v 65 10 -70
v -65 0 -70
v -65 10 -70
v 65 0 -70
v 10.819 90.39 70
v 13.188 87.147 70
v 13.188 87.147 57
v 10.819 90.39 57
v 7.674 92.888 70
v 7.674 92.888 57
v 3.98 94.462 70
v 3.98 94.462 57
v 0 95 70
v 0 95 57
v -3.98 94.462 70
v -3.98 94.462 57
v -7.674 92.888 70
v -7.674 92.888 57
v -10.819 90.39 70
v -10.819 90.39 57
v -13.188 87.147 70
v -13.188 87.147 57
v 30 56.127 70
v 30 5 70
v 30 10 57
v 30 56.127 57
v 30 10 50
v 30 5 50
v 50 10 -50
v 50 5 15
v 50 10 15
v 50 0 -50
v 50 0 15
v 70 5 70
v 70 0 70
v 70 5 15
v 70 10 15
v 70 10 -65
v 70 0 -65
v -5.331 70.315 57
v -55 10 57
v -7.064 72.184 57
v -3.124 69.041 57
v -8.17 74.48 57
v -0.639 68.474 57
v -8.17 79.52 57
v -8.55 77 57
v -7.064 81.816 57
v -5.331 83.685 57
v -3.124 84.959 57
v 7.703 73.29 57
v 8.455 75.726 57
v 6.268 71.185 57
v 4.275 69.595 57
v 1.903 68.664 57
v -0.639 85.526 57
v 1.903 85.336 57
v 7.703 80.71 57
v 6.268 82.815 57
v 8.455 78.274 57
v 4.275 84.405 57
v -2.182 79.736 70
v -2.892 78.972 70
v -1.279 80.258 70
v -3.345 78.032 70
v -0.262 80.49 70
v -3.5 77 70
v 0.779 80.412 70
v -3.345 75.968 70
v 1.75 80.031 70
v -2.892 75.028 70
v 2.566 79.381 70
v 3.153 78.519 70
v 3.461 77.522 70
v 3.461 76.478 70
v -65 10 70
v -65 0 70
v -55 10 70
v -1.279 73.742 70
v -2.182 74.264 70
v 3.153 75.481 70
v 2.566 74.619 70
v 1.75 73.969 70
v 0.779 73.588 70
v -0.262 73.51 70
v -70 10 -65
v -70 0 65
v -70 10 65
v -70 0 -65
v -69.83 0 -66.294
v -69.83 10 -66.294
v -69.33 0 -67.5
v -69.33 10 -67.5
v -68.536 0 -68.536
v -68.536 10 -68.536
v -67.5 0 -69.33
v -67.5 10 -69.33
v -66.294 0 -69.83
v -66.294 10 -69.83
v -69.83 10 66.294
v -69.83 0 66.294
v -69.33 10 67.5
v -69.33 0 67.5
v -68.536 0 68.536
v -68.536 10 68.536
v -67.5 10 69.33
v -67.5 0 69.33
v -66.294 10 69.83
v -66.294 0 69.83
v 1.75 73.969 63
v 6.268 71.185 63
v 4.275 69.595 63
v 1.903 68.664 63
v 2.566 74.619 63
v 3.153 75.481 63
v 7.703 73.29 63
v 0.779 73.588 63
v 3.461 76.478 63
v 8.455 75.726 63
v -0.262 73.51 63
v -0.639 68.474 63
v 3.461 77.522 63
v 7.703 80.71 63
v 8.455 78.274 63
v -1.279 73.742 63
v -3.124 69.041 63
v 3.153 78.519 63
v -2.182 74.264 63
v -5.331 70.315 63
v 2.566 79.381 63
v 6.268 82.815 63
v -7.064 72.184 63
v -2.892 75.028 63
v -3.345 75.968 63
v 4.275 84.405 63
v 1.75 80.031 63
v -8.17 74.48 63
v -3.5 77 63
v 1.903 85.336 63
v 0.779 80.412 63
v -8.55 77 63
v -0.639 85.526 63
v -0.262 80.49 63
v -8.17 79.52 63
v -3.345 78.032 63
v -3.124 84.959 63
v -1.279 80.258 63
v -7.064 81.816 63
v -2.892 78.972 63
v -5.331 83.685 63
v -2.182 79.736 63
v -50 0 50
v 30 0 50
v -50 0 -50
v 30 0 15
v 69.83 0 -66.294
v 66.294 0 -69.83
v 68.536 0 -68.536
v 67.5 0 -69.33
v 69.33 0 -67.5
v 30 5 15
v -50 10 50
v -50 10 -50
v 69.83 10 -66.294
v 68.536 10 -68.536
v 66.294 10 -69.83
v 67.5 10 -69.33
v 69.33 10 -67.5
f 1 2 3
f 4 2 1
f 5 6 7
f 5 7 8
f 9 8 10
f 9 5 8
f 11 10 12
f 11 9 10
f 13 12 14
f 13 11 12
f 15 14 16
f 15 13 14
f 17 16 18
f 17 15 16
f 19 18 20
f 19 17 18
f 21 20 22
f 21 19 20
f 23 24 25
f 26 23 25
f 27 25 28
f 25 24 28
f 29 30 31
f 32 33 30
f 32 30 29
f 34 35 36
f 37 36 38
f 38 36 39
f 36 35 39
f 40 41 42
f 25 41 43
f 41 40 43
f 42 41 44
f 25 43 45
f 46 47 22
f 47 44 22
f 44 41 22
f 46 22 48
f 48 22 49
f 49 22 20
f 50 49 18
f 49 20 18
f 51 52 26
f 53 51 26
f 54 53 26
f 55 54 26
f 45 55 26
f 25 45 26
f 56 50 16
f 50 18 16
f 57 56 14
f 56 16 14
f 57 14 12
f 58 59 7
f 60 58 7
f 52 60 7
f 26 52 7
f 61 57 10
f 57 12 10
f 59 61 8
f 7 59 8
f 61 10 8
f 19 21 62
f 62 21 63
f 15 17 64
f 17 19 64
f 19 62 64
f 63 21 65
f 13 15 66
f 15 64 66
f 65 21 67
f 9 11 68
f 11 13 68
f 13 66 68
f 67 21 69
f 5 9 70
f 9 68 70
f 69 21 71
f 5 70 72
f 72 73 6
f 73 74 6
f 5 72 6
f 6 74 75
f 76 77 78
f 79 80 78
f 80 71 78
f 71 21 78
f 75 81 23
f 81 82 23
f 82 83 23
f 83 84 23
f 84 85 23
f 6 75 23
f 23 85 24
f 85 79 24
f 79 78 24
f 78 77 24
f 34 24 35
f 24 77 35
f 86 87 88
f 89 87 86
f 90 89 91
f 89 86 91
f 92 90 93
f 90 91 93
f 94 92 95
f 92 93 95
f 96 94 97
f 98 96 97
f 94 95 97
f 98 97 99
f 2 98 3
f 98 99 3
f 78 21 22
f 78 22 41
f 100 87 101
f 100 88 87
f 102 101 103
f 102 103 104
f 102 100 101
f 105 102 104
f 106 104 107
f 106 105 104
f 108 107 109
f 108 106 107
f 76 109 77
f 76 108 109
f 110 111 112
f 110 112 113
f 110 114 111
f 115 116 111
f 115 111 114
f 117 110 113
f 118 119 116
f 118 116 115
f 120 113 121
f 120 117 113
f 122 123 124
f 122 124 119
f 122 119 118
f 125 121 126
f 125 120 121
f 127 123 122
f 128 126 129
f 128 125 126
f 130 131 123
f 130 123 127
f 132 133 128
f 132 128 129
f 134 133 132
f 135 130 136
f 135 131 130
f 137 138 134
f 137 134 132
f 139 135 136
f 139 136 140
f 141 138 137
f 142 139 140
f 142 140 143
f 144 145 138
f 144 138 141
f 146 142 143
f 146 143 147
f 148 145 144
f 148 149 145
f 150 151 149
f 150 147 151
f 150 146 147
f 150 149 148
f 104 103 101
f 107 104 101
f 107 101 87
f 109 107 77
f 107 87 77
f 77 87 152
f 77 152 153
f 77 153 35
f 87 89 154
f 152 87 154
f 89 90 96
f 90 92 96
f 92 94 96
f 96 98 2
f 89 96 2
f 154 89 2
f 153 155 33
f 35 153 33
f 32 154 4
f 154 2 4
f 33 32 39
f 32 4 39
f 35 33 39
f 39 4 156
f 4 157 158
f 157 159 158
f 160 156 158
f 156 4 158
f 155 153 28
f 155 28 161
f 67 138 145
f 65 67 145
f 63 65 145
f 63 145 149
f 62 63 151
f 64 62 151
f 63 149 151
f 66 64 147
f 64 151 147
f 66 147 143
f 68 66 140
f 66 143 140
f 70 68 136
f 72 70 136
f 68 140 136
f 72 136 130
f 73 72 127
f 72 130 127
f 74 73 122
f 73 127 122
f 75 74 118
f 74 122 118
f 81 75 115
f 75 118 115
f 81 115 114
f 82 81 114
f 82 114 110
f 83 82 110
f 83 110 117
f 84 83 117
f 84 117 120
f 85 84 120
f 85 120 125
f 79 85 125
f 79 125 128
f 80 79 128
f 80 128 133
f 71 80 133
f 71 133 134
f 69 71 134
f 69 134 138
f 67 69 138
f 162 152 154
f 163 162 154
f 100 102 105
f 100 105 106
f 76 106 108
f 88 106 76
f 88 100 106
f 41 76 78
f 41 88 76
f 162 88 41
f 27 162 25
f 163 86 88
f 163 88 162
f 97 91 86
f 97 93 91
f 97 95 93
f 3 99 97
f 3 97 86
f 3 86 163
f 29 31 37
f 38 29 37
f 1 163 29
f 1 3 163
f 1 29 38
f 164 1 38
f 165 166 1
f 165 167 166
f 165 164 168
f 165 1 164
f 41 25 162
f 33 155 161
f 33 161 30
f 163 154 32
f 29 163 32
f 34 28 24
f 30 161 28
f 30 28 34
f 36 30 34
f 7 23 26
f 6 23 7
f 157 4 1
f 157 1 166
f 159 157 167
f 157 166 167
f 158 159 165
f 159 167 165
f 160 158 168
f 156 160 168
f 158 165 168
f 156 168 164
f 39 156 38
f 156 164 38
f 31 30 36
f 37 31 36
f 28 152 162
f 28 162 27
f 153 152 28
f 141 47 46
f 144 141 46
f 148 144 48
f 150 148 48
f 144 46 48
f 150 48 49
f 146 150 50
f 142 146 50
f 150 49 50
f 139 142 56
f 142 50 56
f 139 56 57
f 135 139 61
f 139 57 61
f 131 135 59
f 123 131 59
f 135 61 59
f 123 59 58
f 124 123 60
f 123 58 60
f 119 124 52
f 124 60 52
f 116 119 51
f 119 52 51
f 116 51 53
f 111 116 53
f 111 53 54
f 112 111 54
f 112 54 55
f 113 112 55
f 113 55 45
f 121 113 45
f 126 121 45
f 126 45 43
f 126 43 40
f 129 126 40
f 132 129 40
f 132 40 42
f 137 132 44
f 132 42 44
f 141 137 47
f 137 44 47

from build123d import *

# Parameters (mm, degrees)
SKETCH1_W                = 140
SKETCH1_H                = 140
SKETCH1_W_2              = 100
SKETCH1_H_2              = 100
BOSS_EXTRUDE1_DEPTH      = 10
BOSS_EXTRUDE2_DEPTH      = 3
BOSS_EXTRUDE2_DEPTH_BACK = 10
SKETCH4_R                = 8.55
CUT_EXTRUDE2_DEPTH       = 6
SKETCH5_R                = 3.5
CUT_EXTRUDE3_DEPTH       = 178.803262062
FILLET1_R                = 5
CUT_EXTRUDE4_START       = 5
SKETCH6_W                = 40
SKETCH6_H                = 55
CUT_EXTRUDE4_DEPTH       = 133.20422734
SKETCH6_3_W              = 40
SKETCH6_3_H              = 55
BOSS_EXTRUDE4_DEPTH      = 5


with BuildPart() as part:
    # Sketch1 → Boss-Extrude1 (new body)
    with BuildSketch(Plane(origin=(0, 0, 0), x_dir=(1, 0, 0), z_dir=(0, 1, 0))):
        Rectangle(SKETCH1_W, SKETCH1_H)
        Rectangle(SKETCH1_W_2, SKETCH1_H_2, mode=Mode.SUBTRACT)
    extrude(amount=BOSS_EXTRUDE1_DEPTH)

    # Sketch2 → Boss-Extrude2 (add, two sides: drawn at the far end of the back side and taken through both)
    with BuildSketch(Plane(origin=(0, 0, 60), x_dir=(-1, 0, 0), z_dir=(0, 0, -1)).offset(-BOSS_EXTRUDE2_DEPTH_BACK)):
        with BuildLine():
            Line((55, 10), (-55, 10))
            Line((-55, 10), (-13.187649977, 87.147439268))
            ThreePointArc((-13.187649977, 87.147439268), (0, 95), (13.187649977, 87.147439268))
            Line((13.187649977, 87.147439268), (55, 10))
        make_face()
    extrude(amount=BOSS_EXTRUDE2_DEPTH + BOSS_EXTRUDE2_DEPTH_BACK)

    # Sketch4 → Cut-Extrude2 (cut)
    with BuildSketch(Plane(origin=(0, 0, 57), x_dir=(-1, 0, 0), z_dir=(0, 0, -1))):
        with Locations((0, 77)):
            Circle(SKETCH4_R)
    extrude(amount=-CUT_EXTRUDE2_DEPTH, mode=Mode.SUBTRACT)

    # Sketch5 → Cut-Extrude3 (cut, through all)
    with BuildSketch(Plane(origin=(0, 0, 63), x_dir=(-1, 0, 0), z_dir=(0, 0, -1))):
        with Locations((0, 77)):
            Circle(SKETCH5_R)
    extrude(amount=-CUT_EXTRUDE3_DEPTH, mode=Mode.SUBTRACT)

    # Fillet1
    fillet1_edges = [part.edges().sort_by_distance(p)[0] for p in [
        (70, 5, 70),
        (-70, 5, 70),
        (-70, 5, -70),
        (70, 5, -70),
    ]]
    fillet(fillet1_edges, radius=FILLET1_R)

    # Sketch6 → Cut-Extrude4 (cut, through all)
    with BuildSketch(Plane(origin=(0, 0, 0), x_dir=(1, 0, 0), z_dir=(0, 1, 0)).offset(CUT_EXTRUDE4_START)):
        with Locations((50, -42.5)):
            Rectangle(SKETCH6_W, SKETCH6_H)
    extrude(amount=CUT_EXTRUDE4_DEPTH, mode=Mode.SUBTRACT)

    # Sketch6<3> → Boss-Extrude4 (add)
    with BuildSketch(Plane(origin=(0, 0, 0), x_dir=(1, 0, 0), z_dir=(0, 1, 0))):
        with Locations((50, -42.5)):
            Rectangle(SKETCH6_3_W, SKETCH6_3_H)
    extrude(amount=BOSS_EXTRUDE4_DEPTH)


solid = part.part
